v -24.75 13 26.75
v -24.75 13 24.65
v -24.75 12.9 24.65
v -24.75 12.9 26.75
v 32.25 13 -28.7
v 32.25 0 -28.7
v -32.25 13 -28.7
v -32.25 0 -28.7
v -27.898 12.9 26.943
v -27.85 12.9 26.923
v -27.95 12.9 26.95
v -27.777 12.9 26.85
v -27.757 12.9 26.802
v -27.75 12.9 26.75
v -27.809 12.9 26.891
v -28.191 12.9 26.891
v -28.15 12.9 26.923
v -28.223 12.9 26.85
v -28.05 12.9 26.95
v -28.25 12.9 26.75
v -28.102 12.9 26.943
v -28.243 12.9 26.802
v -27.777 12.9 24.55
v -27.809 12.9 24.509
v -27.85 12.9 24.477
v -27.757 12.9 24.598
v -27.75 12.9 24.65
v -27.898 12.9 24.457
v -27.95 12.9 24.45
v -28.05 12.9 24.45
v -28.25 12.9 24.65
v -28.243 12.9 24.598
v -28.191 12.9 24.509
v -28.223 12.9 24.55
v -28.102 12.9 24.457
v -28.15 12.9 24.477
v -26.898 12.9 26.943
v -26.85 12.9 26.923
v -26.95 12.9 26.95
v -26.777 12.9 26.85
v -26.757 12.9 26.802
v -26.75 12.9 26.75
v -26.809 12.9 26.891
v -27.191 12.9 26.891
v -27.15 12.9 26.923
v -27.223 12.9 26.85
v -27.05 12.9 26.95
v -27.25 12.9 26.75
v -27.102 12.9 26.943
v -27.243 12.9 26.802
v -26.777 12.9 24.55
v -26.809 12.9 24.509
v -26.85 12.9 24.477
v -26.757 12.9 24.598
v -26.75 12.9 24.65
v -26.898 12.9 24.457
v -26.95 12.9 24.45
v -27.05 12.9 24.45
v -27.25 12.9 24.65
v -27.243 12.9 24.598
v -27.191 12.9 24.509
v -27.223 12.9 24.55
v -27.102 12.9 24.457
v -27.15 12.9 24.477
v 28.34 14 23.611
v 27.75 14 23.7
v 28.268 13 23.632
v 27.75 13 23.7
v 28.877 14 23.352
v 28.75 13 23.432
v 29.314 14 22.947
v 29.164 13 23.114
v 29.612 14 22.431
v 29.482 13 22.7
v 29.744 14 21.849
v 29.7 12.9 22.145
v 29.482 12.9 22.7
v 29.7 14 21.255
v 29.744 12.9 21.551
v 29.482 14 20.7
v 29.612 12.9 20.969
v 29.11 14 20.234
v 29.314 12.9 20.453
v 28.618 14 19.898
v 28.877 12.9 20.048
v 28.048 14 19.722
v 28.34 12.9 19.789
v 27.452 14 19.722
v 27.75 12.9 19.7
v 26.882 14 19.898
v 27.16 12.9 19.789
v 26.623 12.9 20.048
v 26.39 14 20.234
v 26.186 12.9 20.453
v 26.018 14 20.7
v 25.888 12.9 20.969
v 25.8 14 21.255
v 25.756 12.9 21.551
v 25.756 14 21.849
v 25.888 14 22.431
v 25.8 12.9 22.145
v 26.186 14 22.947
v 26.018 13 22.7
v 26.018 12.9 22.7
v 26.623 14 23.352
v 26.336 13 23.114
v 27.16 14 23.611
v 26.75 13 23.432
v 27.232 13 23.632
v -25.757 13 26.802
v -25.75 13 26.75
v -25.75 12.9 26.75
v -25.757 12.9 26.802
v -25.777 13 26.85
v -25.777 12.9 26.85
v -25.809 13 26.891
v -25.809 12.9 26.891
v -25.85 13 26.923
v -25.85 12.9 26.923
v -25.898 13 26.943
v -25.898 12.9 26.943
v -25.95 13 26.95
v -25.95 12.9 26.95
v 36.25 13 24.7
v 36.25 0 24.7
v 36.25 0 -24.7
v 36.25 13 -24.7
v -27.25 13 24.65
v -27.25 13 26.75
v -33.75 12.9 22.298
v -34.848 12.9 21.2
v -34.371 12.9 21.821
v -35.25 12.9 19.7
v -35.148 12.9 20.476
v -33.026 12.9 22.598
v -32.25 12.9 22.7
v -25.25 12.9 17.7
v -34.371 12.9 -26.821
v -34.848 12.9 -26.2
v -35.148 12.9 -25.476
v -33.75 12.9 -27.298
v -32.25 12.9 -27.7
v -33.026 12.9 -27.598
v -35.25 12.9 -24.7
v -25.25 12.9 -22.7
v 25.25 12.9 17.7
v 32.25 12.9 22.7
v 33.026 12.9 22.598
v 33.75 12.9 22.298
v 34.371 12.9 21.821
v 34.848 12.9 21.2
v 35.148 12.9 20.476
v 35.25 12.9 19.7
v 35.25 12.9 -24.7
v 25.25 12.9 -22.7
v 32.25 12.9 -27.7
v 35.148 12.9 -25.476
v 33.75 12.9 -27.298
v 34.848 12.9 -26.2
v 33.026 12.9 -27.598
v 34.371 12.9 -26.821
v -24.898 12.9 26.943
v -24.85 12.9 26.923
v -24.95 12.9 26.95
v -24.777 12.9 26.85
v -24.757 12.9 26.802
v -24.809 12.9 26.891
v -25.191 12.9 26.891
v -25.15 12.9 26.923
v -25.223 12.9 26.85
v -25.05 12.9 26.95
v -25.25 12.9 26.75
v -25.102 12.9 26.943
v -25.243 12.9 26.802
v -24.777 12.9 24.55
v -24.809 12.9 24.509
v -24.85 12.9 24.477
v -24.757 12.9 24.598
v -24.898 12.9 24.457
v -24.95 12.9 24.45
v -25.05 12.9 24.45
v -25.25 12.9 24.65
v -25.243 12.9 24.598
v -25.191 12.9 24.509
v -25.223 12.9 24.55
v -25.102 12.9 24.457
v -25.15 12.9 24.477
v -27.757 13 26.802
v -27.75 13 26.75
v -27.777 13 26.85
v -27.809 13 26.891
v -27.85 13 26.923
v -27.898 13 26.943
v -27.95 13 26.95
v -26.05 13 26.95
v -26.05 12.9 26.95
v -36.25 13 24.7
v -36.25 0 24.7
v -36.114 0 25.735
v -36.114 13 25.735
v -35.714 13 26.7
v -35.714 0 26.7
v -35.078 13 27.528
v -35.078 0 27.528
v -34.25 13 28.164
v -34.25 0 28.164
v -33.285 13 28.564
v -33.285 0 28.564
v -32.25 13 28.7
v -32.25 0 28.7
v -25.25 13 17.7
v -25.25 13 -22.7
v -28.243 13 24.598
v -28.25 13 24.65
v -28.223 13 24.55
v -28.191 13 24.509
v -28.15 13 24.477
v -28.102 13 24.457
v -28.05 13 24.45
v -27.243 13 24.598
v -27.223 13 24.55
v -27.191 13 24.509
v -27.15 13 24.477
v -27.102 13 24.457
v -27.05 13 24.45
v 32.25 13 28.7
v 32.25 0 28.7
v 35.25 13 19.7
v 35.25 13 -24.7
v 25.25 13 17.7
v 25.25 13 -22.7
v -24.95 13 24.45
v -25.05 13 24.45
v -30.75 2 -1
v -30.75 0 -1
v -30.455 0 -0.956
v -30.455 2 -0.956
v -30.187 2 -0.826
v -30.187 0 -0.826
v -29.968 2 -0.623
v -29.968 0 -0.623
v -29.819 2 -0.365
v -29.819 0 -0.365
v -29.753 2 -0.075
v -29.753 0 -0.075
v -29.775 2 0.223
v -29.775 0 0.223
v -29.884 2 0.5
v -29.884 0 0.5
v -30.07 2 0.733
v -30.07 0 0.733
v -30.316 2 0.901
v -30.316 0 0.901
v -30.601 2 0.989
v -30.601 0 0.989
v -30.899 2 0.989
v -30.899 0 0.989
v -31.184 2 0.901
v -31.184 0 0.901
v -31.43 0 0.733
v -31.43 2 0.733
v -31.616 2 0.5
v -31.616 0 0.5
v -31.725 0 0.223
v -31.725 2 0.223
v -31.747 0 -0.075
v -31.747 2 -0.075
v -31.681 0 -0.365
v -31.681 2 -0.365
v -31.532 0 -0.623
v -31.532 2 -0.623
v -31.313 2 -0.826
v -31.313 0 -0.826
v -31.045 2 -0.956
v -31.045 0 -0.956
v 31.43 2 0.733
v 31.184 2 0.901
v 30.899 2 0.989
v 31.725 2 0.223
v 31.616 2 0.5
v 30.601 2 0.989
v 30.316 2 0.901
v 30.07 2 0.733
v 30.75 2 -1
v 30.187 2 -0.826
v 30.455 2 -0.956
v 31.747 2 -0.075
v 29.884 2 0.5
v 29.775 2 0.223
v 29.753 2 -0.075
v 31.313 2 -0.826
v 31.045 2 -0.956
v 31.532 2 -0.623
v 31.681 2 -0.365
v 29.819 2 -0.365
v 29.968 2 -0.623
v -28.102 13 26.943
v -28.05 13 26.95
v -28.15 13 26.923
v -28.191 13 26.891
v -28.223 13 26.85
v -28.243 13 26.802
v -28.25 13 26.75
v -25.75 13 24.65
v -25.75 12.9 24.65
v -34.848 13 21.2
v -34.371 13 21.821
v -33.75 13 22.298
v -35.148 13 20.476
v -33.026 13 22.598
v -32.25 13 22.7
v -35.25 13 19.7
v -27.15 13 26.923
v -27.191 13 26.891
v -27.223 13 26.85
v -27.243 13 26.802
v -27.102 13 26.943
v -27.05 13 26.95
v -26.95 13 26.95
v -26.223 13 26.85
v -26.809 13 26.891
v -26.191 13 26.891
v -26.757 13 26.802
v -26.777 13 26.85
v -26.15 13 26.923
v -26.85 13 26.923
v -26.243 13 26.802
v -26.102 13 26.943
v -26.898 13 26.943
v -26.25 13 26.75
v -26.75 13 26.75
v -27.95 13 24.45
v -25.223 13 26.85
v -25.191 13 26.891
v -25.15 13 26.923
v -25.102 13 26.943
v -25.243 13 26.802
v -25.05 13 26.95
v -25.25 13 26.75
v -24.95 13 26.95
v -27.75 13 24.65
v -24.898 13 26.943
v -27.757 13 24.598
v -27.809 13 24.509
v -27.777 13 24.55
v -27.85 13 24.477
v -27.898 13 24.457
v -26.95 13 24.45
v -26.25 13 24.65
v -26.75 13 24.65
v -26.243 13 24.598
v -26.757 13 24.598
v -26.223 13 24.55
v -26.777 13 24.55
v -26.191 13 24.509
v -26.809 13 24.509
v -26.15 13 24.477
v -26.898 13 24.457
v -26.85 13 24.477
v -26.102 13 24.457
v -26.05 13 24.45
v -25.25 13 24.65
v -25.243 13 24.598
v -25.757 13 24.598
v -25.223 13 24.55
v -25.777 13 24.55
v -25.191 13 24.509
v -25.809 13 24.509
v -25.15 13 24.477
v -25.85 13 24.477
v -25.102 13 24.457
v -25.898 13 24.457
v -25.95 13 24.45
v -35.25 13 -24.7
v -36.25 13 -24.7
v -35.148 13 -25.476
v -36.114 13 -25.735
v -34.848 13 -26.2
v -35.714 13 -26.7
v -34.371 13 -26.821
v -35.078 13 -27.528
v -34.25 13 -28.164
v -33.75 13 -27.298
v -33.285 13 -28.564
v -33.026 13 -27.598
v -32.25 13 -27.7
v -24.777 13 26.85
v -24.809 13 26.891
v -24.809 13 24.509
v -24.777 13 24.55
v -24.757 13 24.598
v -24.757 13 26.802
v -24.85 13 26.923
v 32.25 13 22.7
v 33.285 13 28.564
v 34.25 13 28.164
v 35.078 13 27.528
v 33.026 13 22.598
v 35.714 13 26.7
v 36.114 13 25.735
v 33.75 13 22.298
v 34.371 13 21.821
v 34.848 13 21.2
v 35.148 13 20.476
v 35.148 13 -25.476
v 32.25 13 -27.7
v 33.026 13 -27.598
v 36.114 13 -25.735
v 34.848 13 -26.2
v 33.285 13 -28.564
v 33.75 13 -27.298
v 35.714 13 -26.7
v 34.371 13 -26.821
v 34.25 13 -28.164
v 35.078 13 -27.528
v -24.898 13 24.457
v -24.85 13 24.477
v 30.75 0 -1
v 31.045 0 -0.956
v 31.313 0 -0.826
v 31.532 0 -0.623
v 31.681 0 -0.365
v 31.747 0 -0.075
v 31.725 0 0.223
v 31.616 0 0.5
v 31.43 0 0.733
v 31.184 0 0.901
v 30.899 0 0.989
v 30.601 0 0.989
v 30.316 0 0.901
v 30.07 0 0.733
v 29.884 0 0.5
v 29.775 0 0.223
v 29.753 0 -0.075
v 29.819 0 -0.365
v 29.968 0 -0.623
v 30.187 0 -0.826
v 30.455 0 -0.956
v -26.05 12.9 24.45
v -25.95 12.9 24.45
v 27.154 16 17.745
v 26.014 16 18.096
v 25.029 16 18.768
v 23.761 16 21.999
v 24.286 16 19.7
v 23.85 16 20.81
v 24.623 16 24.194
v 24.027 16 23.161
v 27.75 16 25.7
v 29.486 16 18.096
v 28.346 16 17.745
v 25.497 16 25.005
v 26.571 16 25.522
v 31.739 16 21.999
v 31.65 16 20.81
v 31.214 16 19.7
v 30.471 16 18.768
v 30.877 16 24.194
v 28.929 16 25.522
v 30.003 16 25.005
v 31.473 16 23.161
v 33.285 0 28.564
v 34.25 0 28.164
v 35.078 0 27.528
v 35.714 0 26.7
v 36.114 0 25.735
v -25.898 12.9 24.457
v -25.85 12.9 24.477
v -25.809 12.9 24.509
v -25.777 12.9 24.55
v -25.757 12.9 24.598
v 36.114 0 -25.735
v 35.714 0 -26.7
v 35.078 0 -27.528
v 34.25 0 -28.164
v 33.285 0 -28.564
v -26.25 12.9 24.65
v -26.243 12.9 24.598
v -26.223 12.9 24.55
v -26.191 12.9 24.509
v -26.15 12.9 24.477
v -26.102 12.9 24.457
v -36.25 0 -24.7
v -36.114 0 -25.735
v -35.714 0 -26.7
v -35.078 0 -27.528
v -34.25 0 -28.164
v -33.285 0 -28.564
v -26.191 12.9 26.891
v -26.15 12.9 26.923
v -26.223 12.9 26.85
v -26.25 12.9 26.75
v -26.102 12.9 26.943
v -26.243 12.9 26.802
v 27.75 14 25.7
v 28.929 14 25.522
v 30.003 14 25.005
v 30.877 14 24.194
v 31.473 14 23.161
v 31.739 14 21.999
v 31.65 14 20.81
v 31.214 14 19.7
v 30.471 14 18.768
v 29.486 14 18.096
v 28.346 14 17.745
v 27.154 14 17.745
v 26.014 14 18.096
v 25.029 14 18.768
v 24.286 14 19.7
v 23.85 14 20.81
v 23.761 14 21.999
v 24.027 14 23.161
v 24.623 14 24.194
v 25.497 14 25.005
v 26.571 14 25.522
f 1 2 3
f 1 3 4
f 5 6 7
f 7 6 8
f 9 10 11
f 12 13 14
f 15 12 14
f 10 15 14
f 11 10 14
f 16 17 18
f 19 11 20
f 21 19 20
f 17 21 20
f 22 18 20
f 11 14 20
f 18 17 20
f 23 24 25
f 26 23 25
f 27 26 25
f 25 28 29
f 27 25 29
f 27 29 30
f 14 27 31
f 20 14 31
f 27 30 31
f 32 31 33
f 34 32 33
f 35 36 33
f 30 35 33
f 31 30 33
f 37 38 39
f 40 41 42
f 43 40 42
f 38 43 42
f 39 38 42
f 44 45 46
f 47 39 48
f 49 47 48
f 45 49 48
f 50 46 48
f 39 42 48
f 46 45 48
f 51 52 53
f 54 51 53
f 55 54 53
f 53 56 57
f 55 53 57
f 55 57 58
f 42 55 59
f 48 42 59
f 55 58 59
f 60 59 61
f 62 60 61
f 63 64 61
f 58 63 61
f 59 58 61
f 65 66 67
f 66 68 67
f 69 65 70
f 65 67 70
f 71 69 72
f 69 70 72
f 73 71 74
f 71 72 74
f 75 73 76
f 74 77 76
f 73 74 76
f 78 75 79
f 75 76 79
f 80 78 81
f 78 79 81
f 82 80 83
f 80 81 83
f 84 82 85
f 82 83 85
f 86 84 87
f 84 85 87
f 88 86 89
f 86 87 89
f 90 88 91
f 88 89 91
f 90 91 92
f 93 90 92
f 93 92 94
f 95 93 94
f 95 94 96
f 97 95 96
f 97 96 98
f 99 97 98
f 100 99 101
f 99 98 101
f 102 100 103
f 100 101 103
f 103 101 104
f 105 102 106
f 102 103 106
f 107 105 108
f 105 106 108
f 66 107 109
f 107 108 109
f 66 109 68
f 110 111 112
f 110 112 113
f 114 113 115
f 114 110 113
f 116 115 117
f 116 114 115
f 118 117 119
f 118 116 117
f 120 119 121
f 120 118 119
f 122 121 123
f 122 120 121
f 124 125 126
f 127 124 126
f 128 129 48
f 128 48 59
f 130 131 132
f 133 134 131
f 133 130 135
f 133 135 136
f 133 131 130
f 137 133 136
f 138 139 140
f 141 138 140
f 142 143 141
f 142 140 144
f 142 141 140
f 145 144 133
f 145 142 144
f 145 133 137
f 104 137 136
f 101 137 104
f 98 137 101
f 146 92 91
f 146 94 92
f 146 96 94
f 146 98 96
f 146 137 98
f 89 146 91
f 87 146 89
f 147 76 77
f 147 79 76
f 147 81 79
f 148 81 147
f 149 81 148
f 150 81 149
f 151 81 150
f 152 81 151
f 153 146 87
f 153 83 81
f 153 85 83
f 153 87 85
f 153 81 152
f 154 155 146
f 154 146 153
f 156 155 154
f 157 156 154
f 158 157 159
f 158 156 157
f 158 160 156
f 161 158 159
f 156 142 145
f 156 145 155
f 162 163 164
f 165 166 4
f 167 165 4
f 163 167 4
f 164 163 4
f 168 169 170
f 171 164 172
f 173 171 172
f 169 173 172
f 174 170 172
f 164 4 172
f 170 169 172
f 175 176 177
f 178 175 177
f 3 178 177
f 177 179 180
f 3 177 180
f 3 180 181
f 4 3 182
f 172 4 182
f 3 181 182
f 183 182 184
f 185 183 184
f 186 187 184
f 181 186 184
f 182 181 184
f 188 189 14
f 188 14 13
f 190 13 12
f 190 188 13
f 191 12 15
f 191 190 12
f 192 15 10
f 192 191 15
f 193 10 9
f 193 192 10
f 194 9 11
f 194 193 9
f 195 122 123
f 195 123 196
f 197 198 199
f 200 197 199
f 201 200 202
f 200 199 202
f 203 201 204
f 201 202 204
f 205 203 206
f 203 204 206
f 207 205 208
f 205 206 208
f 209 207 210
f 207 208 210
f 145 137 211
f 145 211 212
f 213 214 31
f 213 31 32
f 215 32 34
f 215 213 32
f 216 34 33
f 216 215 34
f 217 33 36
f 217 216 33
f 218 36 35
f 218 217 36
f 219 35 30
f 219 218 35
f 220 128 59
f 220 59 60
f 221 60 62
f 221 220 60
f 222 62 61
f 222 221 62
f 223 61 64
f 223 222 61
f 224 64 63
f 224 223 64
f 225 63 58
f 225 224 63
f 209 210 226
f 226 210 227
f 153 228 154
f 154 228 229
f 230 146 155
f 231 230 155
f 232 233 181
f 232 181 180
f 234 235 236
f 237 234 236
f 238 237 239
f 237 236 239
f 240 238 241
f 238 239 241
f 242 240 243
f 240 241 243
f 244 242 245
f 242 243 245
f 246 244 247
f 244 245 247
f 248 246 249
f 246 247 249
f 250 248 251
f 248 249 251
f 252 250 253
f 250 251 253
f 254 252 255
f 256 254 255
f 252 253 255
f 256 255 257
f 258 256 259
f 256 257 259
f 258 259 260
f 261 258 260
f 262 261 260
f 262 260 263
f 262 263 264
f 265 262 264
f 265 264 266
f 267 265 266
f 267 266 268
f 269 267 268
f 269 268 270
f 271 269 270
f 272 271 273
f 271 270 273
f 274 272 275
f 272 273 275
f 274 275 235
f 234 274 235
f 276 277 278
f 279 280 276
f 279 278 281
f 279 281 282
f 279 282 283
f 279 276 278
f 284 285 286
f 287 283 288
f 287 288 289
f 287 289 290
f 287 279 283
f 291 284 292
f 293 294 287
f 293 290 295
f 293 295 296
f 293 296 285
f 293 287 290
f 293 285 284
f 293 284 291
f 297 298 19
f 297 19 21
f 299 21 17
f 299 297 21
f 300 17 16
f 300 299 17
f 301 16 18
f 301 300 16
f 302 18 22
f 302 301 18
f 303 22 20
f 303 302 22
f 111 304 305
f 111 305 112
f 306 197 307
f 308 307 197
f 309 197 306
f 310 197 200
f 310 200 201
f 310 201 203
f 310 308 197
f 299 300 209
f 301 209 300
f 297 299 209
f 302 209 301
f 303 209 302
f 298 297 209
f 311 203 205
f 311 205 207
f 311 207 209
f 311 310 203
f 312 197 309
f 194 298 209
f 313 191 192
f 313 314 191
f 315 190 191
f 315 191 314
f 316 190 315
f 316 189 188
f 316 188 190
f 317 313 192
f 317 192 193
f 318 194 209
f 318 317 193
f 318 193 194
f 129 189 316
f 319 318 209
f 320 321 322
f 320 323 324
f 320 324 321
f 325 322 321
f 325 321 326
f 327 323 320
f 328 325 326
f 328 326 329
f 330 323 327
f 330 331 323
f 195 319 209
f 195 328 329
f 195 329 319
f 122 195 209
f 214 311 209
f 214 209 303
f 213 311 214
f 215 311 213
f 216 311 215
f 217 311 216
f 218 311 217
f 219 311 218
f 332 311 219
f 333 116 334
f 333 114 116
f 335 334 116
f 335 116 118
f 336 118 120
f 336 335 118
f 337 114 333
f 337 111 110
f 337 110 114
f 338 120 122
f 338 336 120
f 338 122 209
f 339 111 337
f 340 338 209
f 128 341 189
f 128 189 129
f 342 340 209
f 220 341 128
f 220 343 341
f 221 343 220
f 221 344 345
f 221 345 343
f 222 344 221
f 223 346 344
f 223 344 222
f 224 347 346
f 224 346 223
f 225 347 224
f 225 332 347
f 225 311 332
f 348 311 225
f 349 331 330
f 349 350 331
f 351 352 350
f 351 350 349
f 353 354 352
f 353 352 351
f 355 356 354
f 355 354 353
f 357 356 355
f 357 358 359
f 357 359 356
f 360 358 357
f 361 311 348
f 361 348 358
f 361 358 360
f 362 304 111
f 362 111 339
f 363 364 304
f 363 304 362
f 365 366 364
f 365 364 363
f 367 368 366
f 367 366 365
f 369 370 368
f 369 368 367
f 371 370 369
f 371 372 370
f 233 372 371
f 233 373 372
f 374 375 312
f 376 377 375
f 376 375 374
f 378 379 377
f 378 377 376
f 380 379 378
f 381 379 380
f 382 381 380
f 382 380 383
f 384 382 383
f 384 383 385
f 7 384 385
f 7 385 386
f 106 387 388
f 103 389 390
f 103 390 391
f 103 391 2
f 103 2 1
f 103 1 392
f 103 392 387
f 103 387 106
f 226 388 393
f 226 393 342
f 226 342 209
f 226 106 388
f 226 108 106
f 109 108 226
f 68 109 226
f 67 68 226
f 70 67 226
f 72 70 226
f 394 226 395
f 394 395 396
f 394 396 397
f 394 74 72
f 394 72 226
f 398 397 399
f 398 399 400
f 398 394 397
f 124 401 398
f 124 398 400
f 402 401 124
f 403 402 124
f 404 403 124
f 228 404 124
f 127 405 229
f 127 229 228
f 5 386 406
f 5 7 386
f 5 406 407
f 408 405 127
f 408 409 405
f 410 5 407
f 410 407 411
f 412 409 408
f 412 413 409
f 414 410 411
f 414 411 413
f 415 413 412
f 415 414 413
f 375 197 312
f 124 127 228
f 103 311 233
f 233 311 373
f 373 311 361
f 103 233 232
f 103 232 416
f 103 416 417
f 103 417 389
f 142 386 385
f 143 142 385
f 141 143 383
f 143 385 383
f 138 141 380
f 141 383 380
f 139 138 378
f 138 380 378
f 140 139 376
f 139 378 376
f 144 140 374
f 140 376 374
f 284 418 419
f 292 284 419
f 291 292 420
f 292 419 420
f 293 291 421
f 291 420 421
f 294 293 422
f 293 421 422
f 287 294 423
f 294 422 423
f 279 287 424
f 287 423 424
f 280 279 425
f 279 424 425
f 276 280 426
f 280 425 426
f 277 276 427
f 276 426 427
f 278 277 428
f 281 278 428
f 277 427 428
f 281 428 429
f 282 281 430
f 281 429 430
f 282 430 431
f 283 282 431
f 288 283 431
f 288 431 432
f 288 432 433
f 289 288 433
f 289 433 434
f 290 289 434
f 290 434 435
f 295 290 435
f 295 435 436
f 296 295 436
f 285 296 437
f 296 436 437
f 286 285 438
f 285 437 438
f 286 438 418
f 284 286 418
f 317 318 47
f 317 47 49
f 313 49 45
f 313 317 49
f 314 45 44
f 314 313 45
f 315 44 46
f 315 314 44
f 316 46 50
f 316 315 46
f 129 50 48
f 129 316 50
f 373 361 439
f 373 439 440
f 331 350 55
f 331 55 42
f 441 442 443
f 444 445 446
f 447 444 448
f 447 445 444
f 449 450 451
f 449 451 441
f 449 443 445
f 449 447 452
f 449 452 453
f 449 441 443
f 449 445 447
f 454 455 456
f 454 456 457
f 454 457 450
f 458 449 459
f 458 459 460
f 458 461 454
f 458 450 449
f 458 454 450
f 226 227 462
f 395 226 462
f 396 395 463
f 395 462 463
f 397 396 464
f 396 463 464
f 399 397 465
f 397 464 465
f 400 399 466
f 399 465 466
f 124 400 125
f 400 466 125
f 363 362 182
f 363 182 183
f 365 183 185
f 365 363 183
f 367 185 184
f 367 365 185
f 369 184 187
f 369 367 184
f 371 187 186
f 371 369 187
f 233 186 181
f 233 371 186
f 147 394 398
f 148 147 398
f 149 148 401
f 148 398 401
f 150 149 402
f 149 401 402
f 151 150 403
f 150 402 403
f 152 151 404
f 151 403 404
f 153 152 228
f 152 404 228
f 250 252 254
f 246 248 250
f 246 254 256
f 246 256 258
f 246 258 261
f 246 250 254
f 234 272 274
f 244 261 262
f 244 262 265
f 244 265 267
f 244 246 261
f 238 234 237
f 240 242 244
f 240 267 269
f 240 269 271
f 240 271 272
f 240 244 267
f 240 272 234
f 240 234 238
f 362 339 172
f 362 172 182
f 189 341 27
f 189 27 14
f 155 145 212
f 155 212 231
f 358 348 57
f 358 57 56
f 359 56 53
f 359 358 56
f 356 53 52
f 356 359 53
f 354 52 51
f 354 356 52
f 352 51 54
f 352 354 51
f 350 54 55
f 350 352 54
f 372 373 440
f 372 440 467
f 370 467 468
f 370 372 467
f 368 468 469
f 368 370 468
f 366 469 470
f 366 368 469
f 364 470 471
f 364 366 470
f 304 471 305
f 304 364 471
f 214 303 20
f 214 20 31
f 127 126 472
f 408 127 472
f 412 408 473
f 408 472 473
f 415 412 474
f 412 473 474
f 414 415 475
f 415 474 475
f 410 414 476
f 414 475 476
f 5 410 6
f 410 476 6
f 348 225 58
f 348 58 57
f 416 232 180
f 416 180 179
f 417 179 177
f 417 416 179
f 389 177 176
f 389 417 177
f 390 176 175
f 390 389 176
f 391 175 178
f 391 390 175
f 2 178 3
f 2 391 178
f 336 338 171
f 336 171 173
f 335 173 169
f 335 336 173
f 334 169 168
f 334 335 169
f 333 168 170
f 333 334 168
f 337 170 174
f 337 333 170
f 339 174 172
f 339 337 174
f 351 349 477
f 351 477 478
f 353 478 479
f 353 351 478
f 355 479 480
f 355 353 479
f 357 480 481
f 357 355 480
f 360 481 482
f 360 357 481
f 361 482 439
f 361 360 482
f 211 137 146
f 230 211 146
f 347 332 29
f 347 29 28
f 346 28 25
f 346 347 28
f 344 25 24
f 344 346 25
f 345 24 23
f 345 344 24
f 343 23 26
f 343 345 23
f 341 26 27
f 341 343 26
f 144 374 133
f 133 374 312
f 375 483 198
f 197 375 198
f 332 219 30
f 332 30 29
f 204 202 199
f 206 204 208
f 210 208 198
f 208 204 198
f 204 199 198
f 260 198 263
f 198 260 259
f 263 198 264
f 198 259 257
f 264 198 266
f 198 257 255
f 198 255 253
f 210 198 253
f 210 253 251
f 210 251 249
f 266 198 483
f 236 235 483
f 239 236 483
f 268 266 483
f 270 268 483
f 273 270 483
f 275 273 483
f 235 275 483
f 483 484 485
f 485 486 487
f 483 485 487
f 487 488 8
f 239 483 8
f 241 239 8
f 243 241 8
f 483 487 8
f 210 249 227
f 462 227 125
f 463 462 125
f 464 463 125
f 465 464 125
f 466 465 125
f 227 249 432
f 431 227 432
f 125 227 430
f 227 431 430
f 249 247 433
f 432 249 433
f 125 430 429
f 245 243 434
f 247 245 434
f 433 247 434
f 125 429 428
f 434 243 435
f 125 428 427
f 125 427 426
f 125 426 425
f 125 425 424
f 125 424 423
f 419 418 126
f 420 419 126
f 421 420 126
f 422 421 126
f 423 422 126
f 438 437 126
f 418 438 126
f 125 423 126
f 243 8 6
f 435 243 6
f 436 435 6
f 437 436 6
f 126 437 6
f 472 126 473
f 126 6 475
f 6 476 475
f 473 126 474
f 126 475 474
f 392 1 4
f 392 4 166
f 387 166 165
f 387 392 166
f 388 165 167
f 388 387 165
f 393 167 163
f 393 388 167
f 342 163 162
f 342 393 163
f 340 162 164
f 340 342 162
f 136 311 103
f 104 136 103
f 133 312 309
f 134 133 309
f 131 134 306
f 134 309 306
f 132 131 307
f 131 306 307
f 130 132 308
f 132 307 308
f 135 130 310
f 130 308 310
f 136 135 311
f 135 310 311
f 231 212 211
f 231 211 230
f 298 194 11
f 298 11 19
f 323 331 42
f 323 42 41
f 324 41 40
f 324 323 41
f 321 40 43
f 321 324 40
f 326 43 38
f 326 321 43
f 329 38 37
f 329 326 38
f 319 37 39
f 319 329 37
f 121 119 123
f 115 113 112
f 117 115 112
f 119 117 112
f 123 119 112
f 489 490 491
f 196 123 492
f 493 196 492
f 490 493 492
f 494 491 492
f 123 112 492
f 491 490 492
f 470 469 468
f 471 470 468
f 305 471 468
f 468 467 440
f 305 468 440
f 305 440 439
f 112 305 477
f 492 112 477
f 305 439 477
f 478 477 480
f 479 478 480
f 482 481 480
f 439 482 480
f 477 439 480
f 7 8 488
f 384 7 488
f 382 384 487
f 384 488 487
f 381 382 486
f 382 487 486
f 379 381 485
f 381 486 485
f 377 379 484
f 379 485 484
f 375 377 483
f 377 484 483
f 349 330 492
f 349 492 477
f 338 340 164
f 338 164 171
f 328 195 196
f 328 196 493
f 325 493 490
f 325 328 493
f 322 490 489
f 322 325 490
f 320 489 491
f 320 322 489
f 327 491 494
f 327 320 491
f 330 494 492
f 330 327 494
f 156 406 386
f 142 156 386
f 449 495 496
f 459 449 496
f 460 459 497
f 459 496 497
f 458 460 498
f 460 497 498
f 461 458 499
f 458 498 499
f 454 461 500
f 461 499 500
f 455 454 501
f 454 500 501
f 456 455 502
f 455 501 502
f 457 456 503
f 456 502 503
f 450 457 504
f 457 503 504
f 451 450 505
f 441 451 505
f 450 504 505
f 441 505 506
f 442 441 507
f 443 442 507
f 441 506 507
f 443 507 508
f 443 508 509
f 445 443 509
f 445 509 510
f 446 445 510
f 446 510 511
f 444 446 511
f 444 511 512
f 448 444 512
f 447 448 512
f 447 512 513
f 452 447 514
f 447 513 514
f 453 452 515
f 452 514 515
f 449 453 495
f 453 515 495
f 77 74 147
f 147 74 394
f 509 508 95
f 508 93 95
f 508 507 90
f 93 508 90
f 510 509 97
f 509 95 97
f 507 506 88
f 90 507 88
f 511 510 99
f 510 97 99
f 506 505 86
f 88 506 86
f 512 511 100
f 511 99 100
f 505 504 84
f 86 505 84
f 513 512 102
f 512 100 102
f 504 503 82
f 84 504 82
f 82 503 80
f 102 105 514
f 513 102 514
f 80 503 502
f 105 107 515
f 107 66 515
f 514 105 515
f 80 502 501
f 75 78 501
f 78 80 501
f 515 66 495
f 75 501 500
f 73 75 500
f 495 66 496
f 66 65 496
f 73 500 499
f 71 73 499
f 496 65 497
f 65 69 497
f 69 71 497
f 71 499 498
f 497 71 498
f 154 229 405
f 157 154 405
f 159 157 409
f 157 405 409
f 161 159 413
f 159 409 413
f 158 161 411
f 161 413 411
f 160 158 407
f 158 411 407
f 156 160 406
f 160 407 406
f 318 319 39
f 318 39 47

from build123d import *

# Parameters (mm, degrees)
BOSS_EXTRUDE1_DEPTH      = 13
CUT_EXTRUDE1_DEPTH       = 0.1
SKETCH3_W                = 50.5
SKETCH3_H                = 40.4
BOSS_EXTRUDE2_DEPTH      = 0.1
SKETCH4_R                = 2
BOSS_EXTRUDE3_DEPTH      = 1
BOSS_EXTRUDE3_DEPTH_BACK = 1
SKETCH5_R                = 4
BOSS_EXTRUDE4_DEPTH      = 2
SKETCH6_R                = 1
CUT_EXTRUDE3_DEPTH       = 2


with BuildPart() as part:
    # Sketch1 → Boss-Extrude1 (new body)
    with BuildSketch(Plane(origin=(0, 0, 0), x_dir=(1, 0, 0), z_dir=(0, 1, 0))):
        with BuildLine():
            Line((32.25, 28.7), (-32.25, 28.7))
            ThreePointArc((-32.25, 28.7), (-35.078427125, 27.528427125), (-36.25, 24.7))
            Line((-36.25, 24.7), (-36.25, -24.7))
            ThreePointArc((-36.25, -24.7), (-35.078427125, -27.528427125), (-32.25, -28.7))
            Line((-32.25, -28.7), (32.25, -28.7))
            ThreePointArc((32.25, -28.7), (35.078427125, -27.528427125), (36.25, -24.7))
            Line((36.25, -24.7), (36.25, 24.7))
            ThreePointArc((36.25, 24.7), (35.078427125, 27.528427125), (32.25, 28.7))
        make_face()
    extrude(amount=BOSS_EXTRUDE1_DEPTH)

    # Sketch2 → Cut-Extrude1 (cut)
    with BuildSketch(Plane(origin=(0, 13, 0), x_dir=(1, 0, 0), z_dir=(0, 1, 0))):
        with BuildLine():
            Line((-27.25, -26.75), (-27.25, -24.65))
            ThreePointArc((-27.25, -24.65), (-27.191421356, -24.508578644), (-27.05, -24.45))
            Line((-27.05, -24.45), (-26.95, -24.45))
            ThreePointArc((-26.95, -24.45), (-26.808578644, -24.508578644), (-26.75, -24.65))
            Line((-26.75, -24.65), (-26.75, -26.75))
            ThreePointArc((-26.75, -26.75), (-26.808578644, -26.891421356), (-26.95, -26.95))
            Line((-26.95, -26.95), (-27.05, -26.95))
            ThreePointArc((-27.05, -26.95), (-27.191421356, -26.891421356), (-27.25, -26.75))
        make_face()
        with BuildLine():
            Line((-32.25, -22.7), (32.25, -22.7))
            ThreePointArc((32.25, -22.7), (34.371320344, -21.821320344), (35.25, -19.7))
            Line((35.25, -19.7), (35.25, 24.7))
            ThreePointArc((35.25, 24.7), (34.371320344, 26.821320344), (32.25, 27.7))
            Line((32.25, 27.7), (-32.25, 27.7))
            ThreePointArc((-32.25, 27.7), (-34.371320344, 26.821320344), (-35.25, 24.7))
            Line((-35.25, 24.7), (-35.25, -19.7))
            ThreePointArc((-35.25, -19.7), (-34.371320344, -21.821320344), (-32.25, -22.7))
        make_face()
        with BuildLine():
            Line((-28.25, -26.75), (-28.25, -24.65))
            ThreePointArc((-28.25, -24.65), (-28.191421356, -24.508578644), (-28.05, -24.45))
            Line((-28.05, -24.45), (-27.95, -24.45))
            ThreePointArc((-27.95, -24.45), (-27.808578644, -24.508578644), (-27.75, -24.65))
            Line((-27.75, -24.65), (-27.75, -26.75))
            ThreePointArc((-27.75, -26.75), (-27.808578644, -26.891421356), (-27.95, -26.95))
            Line((-27.95, -26.95), (-28.05, -26.95))
            ThreePointArc((-28.05, -26.95), (-28.191421356, -26.891421356), (-28.25, -26.75))
        make_face()
        with BuildLine():
            Line((-26.25, -26.75), (-26.25, -24.65))
            ThreePointArc((-26.25, -24.65), (-26.191421356, -24.508578644), (-26.05, -24.45))
            Line((-26.05, -24.45), (-25.95, -24.45))
            ThreePointArc((-25.95, -24.45), (-25.808578644, -24.508578644), (-25.75, -24.65))
            Line((-25.75, -24.65), (-25.75, -26.75))
            ThreePointArc((-25.75, -26.75), (-25.808578644, -26.891421356), (-25.95, -26.95))
            Line((-25.95, -26.95), (-26.05, -26.95))
            ThreePointArc((-26.05, -26.95), (-26.191421356, -26.891421356), (-26.25, -26.75))
        make_face()
        with BuildLine():
            Line((-25.25, -26.75), (-25.25, -24.65))
            ThreePointArc((-25.25, -24.65), (-25.191421356, -24.508578644), (-25.05, -24.45))
            Line((-25.05, -24.45), (-24.95, -24.45))
            ThreePointArc((-24.95, -24.45), (-24.808578644, -24.508578644), (-24.75, -24.65))
            Line((-24.75, -24.65), (-24.75, -26.75))
            ThreePointArc((-24.75, -26.75), (-24.808578644, -26.891421356), (-24.95, -26.95))
            Line((-24.95, -26.95), (-25.05, -26.95))
            ThreePointArc((-25.05, -26.95), (-25.191421356, -26.891421356), (-25.25, -26.75))
        make_face()
    extrude(amount=-CUT_EXTRUDE1_DEPTH, mode=Mode.SUBTRACT)

    # Sketch3 → Boss-Extrude2 (add)
    with BuildSketch(Plane(origin=(0, 12.9, 0), x_dir=(1, 0, 0), z_dir=(0, 1, 0))):
        with Locations((0, 2.5)):
            Rectangle(SKETCH3_W, SKETCH3_H)
    extrude(amount=BOSS_EXTRUDE2_DEPTH)

    # Sketch4 → Boss-Extrude3 (add, two sides)
    with BuildSketch(Plane(origin=(0, 13, 0), x_dir=(1, 0, 0), z_dir=(0, 1, 0))) as boss_extrude3_sk:
        with Locations(Location((27.75, -21.7, 0), (0, 0, 270))):  # turned: the seam where the file's is
            Circle(SKETCH4_R)
    extrude(amount=BOSS_EXTRUDE3_DEPTH)
    extrude(boss_extrude3_sk.sketch, amount=-BOSS_EXTRUDE3_DEPTH_BACK)

    # Sketch5 → Boss-Extrude4 (add)
    with BuildSketch(Plane(origin=(0, 14, 0), x_dir=(1, 0, 0), z_dir=(0, 1, 0))):
        with Locations(Location((27.75, -21.7, 0), (0, 0, 270))):  # turned: the seam where the file's is
            Circle(SKETCH5_R)
    extrude(amount=BOSS_EXTRUDE4_DEPTH)

    # Sketch6 → Cut-Extrude3 (cut)
    with BuildSketch(Plane.XZ):
        with Locations(Location((30.75, 0, 0), (0, 0, 270))):  # turned: the seam where the file's is
            Circle(SKETCH6_R)
        with Locations(Location((-30.75, 0, 0), (0, 0, 270))):  # turned: the seam where the file's is
            Circle(SKETCH6_R)
    extrude(amount=-CUT_EXTRUDE3_DEPTH, mode=Mode.SUBTRACT)


solid = part.part
